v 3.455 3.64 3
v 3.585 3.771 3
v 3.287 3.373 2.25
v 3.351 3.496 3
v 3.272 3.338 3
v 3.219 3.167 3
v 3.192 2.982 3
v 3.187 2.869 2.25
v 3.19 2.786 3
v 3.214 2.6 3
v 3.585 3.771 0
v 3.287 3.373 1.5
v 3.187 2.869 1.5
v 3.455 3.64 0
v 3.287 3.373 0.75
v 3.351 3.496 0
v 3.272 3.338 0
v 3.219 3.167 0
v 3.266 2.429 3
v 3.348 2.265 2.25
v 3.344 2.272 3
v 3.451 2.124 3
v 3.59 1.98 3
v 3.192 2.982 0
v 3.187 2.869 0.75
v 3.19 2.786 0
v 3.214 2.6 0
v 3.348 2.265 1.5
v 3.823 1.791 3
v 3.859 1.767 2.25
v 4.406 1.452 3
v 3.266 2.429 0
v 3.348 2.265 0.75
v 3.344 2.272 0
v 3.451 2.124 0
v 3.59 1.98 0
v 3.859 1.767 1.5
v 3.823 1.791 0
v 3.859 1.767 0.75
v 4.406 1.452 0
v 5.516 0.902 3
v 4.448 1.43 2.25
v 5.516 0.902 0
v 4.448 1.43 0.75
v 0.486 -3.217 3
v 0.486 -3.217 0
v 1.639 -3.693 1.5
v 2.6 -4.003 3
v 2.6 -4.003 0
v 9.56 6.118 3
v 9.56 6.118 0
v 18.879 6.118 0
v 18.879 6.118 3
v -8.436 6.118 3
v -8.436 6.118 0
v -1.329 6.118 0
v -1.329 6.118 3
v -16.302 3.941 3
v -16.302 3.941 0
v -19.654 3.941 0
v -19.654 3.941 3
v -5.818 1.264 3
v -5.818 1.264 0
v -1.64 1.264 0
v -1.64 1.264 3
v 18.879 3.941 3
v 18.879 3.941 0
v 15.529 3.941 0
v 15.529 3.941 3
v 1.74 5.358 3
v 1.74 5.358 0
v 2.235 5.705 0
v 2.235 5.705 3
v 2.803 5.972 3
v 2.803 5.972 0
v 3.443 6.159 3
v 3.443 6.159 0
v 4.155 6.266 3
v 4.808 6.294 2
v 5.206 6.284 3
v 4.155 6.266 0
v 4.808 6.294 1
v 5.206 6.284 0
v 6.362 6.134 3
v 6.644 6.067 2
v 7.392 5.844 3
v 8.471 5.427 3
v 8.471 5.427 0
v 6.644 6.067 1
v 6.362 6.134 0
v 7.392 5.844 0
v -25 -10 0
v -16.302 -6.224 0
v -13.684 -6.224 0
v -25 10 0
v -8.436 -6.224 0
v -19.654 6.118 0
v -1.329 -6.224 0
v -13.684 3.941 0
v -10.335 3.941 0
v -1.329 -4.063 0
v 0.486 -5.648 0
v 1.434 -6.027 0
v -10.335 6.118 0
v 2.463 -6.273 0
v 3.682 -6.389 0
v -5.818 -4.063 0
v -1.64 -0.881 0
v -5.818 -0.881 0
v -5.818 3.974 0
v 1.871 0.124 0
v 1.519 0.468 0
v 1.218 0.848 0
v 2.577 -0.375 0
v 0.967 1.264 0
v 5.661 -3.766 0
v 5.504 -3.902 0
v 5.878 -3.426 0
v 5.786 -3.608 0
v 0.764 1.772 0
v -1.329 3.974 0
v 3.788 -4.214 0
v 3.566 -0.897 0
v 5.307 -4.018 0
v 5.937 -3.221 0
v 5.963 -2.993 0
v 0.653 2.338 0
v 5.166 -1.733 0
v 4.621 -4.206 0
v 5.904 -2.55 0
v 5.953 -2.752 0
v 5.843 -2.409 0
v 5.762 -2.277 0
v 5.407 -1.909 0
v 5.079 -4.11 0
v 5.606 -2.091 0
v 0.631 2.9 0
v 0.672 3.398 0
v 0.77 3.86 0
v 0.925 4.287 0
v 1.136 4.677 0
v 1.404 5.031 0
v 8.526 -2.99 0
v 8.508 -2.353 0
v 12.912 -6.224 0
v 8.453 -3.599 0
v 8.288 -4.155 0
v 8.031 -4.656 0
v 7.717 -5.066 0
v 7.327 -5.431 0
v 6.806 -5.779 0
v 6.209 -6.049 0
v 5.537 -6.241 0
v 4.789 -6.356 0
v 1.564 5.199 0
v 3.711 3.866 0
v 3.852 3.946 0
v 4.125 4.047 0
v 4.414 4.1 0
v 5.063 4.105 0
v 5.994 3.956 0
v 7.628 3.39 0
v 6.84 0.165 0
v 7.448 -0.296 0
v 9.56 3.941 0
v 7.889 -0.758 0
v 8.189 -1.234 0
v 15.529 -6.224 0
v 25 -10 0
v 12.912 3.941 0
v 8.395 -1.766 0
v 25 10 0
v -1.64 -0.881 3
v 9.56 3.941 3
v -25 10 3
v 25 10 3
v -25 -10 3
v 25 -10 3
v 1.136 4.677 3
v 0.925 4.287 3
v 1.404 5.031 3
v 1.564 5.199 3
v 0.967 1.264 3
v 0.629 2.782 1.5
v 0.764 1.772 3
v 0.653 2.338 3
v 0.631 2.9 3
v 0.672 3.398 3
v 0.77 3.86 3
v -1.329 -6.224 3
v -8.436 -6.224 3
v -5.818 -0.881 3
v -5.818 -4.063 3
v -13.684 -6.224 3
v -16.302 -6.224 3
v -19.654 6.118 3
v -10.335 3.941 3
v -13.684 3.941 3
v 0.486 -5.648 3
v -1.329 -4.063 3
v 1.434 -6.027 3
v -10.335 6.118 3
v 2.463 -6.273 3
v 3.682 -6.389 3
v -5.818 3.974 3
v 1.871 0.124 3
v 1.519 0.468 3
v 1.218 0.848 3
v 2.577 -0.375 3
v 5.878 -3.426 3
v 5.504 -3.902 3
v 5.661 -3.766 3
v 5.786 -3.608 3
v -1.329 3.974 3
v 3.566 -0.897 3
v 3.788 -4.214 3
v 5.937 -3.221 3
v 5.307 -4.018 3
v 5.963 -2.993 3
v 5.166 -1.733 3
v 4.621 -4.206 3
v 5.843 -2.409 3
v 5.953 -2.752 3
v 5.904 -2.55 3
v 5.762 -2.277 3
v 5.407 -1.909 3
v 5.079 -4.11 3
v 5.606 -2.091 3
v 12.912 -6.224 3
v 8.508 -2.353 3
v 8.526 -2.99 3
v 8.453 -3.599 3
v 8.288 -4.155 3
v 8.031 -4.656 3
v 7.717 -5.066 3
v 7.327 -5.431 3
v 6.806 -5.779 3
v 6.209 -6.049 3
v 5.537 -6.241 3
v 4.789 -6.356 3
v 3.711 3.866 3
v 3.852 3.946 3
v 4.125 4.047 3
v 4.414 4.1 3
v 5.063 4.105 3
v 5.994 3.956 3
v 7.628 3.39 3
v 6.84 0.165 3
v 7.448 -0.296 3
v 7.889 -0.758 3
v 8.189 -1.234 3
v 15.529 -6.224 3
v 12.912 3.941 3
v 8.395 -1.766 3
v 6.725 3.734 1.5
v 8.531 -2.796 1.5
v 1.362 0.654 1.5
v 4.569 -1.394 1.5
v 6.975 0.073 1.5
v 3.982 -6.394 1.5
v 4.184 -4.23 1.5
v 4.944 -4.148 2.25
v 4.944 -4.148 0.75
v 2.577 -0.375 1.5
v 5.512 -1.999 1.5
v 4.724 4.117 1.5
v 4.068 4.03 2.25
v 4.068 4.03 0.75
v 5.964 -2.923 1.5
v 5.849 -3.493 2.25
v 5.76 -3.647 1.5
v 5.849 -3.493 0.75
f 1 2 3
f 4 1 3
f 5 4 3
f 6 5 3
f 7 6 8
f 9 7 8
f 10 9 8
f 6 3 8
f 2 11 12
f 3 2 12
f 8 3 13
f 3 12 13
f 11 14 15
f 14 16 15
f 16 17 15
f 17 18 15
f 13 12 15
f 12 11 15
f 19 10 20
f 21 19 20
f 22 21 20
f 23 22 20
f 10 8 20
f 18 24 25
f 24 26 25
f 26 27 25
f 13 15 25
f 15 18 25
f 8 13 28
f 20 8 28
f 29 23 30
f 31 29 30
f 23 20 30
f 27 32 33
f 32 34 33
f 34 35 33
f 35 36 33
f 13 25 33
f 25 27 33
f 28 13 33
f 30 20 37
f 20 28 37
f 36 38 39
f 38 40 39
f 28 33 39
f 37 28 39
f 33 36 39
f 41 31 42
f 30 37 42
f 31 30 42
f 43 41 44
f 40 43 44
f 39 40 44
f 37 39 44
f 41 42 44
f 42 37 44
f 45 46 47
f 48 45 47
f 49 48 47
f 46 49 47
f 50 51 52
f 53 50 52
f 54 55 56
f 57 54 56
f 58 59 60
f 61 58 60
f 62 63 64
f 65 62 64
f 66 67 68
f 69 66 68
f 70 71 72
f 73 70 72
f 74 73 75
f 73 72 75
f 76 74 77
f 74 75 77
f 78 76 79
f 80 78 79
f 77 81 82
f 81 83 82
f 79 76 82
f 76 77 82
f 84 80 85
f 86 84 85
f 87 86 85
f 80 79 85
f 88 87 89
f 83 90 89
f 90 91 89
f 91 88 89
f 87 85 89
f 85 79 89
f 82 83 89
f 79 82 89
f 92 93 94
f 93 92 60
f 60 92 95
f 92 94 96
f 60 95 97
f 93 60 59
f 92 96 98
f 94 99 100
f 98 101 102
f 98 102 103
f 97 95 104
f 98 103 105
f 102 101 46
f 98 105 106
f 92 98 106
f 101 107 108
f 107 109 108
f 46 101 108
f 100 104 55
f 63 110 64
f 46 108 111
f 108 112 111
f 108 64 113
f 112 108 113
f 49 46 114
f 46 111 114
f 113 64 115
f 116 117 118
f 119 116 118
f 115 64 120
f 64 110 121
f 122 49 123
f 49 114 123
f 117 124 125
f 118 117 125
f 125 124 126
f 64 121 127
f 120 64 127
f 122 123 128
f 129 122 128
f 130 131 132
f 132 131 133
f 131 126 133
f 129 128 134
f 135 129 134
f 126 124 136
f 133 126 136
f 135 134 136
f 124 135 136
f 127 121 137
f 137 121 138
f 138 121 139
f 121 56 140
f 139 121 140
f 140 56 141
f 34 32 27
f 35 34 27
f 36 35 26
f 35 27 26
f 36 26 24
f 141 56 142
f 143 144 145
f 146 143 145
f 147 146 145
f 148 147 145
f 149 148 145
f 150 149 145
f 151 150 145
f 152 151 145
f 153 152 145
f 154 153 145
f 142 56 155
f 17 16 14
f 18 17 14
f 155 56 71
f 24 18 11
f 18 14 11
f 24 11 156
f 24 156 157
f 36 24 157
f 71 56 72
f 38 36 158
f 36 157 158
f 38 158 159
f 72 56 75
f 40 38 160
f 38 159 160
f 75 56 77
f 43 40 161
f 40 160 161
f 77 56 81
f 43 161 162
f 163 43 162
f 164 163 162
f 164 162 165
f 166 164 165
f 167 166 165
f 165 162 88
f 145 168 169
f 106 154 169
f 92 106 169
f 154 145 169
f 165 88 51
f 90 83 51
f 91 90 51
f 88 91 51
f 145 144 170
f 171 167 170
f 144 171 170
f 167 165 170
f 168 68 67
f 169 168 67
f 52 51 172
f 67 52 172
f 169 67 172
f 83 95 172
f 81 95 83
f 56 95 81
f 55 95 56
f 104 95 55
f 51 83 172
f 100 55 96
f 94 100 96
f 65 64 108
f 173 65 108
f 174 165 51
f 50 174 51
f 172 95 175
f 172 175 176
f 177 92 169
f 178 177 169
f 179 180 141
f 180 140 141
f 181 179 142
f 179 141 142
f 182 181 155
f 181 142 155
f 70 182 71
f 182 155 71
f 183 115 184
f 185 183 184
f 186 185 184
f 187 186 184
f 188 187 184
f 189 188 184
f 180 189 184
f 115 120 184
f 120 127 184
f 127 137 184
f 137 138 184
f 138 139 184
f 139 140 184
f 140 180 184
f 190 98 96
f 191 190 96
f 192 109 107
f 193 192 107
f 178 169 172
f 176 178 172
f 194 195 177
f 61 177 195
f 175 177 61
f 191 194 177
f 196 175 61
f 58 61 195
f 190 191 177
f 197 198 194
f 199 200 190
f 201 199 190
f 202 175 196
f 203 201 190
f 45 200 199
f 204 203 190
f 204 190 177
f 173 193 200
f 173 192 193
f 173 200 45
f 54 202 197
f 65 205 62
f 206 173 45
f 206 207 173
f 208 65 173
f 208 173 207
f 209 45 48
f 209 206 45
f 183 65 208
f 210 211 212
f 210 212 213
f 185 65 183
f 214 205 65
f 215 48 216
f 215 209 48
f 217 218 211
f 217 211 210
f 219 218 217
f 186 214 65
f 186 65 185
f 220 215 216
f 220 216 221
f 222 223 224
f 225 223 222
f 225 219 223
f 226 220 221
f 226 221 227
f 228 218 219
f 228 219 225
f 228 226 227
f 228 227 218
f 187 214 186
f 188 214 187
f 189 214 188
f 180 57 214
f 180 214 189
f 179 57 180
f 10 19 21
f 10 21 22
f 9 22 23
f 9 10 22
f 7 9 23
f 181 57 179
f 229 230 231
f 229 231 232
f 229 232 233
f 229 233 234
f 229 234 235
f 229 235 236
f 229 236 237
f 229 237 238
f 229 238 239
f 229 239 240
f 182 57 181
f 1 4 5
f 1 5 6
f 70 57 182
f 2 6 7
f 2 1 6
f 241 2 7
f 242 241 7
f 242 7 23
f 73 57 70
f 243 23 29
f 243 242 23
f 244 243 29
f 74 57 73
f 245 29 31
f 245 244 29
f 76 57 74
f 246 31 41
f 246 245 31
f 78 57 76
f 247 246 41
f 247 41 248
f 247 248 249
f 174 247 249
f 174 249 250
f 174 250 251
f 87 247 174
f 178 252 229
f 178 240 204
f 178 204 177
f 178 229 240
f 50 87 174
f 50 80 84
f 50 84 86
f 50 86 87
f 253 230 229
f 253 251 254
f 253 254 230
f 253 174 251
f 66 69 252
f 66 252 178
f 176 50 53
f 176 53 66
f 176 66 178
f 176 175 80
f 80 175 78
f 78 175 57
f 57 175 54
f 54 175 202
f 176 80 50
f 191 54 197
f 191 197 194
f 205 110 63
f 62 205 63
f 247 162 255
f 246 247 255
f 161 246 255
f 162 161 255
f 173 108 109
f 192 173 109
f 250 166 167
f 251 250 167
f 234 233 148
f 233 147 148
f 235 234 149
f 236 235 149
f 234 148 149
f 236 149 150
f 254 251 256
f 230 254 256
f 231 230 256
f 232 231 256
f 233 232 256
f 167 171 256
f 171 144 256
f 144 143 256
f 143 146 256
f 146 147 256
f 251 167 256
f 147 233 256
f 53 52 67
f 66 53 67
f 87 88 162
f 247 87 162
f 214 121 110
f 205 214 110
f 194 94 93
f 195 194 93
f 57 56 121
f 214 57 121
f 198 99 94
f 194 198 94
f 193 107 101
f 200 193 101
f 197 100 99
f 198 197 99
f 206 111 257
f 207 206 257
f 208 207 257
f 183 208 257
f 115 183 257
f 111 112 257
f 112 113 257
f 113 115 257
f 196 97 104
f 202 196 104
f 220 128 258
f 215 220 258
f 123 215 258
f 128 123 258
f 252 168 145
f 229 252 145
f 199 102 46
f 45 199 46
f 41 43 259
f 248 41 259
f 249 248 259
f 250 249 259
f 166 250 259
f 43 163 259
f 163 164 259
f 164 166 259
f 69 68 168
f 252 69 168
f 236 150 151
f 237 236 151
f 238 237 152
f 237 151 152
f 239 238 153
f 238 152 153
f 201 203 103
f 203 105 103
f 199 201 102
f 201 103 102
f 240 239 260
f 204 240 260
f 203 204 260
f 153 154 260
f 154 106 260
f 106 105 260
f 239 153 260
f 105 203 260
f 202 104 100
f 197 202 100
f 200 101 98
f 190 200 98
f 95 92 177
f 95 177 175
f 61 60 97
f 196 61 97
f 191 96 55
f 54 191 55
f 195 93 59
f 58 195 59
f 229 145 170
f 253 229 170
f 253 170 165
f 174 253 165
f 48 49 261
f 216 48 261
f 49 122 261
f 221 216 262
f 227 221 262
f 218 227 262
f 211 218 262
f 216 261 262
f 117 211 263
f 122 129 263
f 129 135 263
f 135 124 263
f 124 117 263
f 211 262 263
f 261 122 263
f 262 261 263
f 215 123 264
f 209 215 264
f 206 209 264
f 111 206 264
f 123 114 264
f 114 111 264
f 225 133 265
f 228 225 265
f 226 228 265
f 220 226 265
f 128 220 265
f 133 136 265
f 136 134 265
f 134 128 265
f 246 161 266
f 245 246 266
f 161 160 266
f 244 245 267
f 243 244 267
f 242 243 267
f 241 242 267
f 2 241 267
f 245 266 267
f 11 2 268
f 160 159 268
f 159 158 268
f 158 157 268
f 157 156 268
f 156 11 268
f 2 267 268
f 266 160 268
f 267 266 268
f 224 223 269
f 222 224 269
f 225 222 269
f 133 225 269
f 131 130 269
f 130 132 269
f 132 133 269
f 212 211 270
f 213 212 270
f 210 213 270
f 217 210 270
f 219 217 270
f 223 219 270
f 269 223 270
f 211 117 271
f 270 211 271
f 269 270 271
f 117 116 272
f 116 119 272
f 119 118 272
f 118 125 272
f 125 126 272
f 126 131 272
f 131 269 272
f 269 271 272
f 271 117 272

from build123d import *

# Parameters (mm, degrees)
F0_W     = 50
F0_H     = 20
F1_DEPTH = 3


with BuildPart() as f1:
    # F0 (on Top) → F1 (new body)
    with BuildSketch(Plane.XY):
        Rectangle(F0_W, F0_H)
        Polygon((-13.6844948676, 3.9411129119), (-13.6844948676, -6.2236628849), (-16.3019989195, -6.2236628849), (-16.3019989195, 3.9411129119), (-19.6542409508, 3.9411129119), (-19.6542409508, 6.1183144246), (-10.3349540789, 6.1183144246), (-10.3349540789, 3.9411129119), align=None, mode=Mode.SUBTRACT)
        Polygon((-1.3290113452, -4.0626688277), (-1.3290113452, -6.2236628849), (-8.4359805511, -6.2236628849), (-8.4359805511, 6.1183144246), (-1.3290113452, 6.1183144246), (-1.3290113452, 3.9735278228), (-5.8184764992, 3.9735278228), (-5.8184764992, 1.2641815235), (-1.639654241, 1.2641815235), (-1.639654241, -0.8806050783), (-5.8184764992, -0.8806050783), (-5.8184764992, -4.0626688277), align=None, mode=Mode.SUBTRACT)
        with BuildLine():
            add(Edge.make_bspline(
                [(7.8889789303, -0.7576985413), (8.5305240411, -1.5883306321), (8.5305240411, -2.7957860616)],
                knots=[0, 0, 0, 1, 1, 1], degree=2))
            add(Edge.make_bspline(
                [(8.5305240411, -2.7957860616), (8.5305240411, -4.4678552134), (7.3271204754, -5.4308481902)],
                knots=[0, 0, 0, 1, 1, 1], degree=2))
            add(Edge.make_bspline(
                [(7.3271204754, -5.4308481902), (6.1237169098, -6.3938411669), (3.9816315505, -6.3938411669)],
                knots=[0, 0, 0, 1, 1, 1], degree=2))
            add(Edge.make_bspline(
                [(3.9816315505, -6.3938411669), (2.0043219881, -6.3938411669), (0.4862236629, -5.6482982172)],
                knots=[0, 0, 0, 1, 1, 1], degree=2))
            Line((0.4862236629, -5.6482982172), (0.4862236629, -3.2171799028))
            add(Edge.make_bspline(
                [(0.4862236629, -3.2171799028), (1.734197731, -3.7763371151), (2.5999459751, -4.0032414911)],
                knots=[0, 0, 0, 1, 1, 1], degree=2))
            add(Edge.make_bspline(
                [(2.5999459751, -4.0032414911), (3.4656942193, -4.2301458671), (4.1842247434, -4.2301458671)],
                knots=[0, 0, 0, 1, 1, 1], degree=2))
            add(Edge.make_bspline(
                [(4.1842247434, -4.2301458671), (5.0432198811, -4.2301458671), (5.5037817396, -3.9019448947)],
                knots=[0, 0, 0, 1, 1, 1], degree=2))
            add(Edge.make_bspline(
                [(5.5037817396, -3.9019448947), (5.9643435981, -3.5737439222), (5.9643435981, -2.9227444625)],
                knots=[0, 0, 0, 1, 1, 1], degree=2))
            add(Edge.make_bspline(
                [(5.9643435981, -2.9227444625), (5.9643435981, -2.5607779579), (5.7617504052, -2.2771474878)],
                knots=[0, 0, 0, 1, 1, 1], degree=2))
            add(Edge.make_bspline(
                [(5.7617504052, -2.2771474878), (5.5591572123, -1.9935170178), (5.1661264182, -1.7328471097)],
                knots=[0, 0, 0, 1, 1, 1], degree=2))
            add(Edge.make_bspline(
                [(5.1661264182, -1.7328471097), (4.773095624, -1.4721772015), (3.5656401945, -0.8968125338)],
                knots=[0, 0, 0, 1, 1, 1], degree=2))
            add(Edge.make_bspline(
                [(3.5656401945, -0.8968125338), (2.4365207996, -0.3646677472), (1.8706104808, 0.1242571583)],
                knots=[0, 0, 0, 1, 1, 1], degree=2))
            add(Edge.make_bspline(
                [(1.8706104808, 0.1242571583), (1.3047001621, 0.6131820637), (0.9670448406, 1.2641815235)],
                knots=[0, 0, 0, 1, 1, 1], degree=2))
            add(Edge.make_bspline(
                [(0.9670448406, 1.2641815235), (0.6293895192, 1.9151809833), (0.6293895192, 2.7822798487)],
                knots=[0, 0, 0, 1, 1, 1], degree=2))
            add(Edge.make_bspline(
                [(0.6293895192, 2.7822798487), (0.6293895192, 4.4219340897), (1.7396002161, 5.3579146407)],
                knots=[0, 0, 0, 1, 1, 1], degree=2))
            add(Edge.make_bspline(
                [(1.7396002161, 5.3579146407), (2.849810913, 6.2938951918), (4.8082117774, 6.2938951918)],
                knots=[0, 0, 0, 1, 1, 1], degree=2))
            add(Edge.make_bspline(
                [(4.8082117774, 6.2938951918), (5.7698541329, 6.2938951918), (6.6437061048, 6.0669908158)],
                knots=[0, 0, 0, 1, 1, 1], degree=2))
            add(Edge.make_bspline(
                [(6.6437061048, 6.0669908158), (7.5175580767, 5.8400864398), (8.4710967045, 5.4267963263)],
                knots=[0, 0, 0, 1, 1, 1], degree=2))
            Line((8.4710967045, 5.4267963263), (7.6283090222, 3.3900594273))
            add(Edge.make_bspline(
                [(7.6283090222, 3.3900594273), (6.639654241, 3.7952458131), (5.9940572663, 3.9559697461)],
                knots=[0, 0, 0, 1, 1, 1], degree=2))
            add(Edge.make_bspline(
                [(5.9940572663, 3.9559697461), (5.3484602917, 4.1166936791), (4.7244732577, 4.1166936791)],
                knots=[0, 0, 0, 1, 1, 1], degree=2))
            add(Edge.make_bspline(
                [(4.7244732577, 4.1166936791), (3.9816315505, 4.1166936791), (3.5845488925, 3.7709346299)],
                knots=[0, 0, 0, 1, 1, 1], degree=2))
            add(Edge.make_bspline(
                [(3.5845488925, 3.7709346299), (3.1874662345, 3.4251755808), (3.1874662345, 2.868719611)],
                knots=[0, 0, 0, 1, 1, 1], degree=2))
            add(Edge.make_bspline(
                [(3.1874662345, 2.868719611), (3.1874662345, 2.5229605619), (3.3481901675, 2.2649918963)],
                knots=[0, 0, 0, 1, 1, 1], degree=2))
            add(Edge.make_bspline(
                [(3.3481901675, 2.2649918963), (3.5089141005, 2.0070232307), (3.8587250135, 1.7666126418)],
                knots=[0, 0, 0, 1, 1, 1], degree=2))
            add(Edge.make_bspline(
                [(3.8587250135, 1.7666126418), (4.2085359265, 1.5262020529), (5.5159373312, 0.9022150189)],
                knots=[0, 0, 0, 1, 1, 1], degree=2))
            add(Edge.make_bspline(
                [(5.5159373312, 0.9022150189), (7.2474338196, 0.0729335494), (7.8889789303, -0.7576985413)],
                knots=[0, 0, 0, 1, 1, 1], degree=2))
        make_face(mode=Mode.SUBTRACT)
        Polygon((15.529443544, 3.9411129119), (15.529443544, -6.2236628849), (12.9119394922, -6.2236628849), (12.9119394922, 3.9411129119), (9.5596974608, 3.9411129119), (9.5596974608, 6.1183144246), (18.8789843328, 6.1183144246), (18.8789843328, 3.9411129119), align=None, mode=Mode.SUBTRACT)
    extrude(amount=F1_DEPTH)


solid = f1.part
